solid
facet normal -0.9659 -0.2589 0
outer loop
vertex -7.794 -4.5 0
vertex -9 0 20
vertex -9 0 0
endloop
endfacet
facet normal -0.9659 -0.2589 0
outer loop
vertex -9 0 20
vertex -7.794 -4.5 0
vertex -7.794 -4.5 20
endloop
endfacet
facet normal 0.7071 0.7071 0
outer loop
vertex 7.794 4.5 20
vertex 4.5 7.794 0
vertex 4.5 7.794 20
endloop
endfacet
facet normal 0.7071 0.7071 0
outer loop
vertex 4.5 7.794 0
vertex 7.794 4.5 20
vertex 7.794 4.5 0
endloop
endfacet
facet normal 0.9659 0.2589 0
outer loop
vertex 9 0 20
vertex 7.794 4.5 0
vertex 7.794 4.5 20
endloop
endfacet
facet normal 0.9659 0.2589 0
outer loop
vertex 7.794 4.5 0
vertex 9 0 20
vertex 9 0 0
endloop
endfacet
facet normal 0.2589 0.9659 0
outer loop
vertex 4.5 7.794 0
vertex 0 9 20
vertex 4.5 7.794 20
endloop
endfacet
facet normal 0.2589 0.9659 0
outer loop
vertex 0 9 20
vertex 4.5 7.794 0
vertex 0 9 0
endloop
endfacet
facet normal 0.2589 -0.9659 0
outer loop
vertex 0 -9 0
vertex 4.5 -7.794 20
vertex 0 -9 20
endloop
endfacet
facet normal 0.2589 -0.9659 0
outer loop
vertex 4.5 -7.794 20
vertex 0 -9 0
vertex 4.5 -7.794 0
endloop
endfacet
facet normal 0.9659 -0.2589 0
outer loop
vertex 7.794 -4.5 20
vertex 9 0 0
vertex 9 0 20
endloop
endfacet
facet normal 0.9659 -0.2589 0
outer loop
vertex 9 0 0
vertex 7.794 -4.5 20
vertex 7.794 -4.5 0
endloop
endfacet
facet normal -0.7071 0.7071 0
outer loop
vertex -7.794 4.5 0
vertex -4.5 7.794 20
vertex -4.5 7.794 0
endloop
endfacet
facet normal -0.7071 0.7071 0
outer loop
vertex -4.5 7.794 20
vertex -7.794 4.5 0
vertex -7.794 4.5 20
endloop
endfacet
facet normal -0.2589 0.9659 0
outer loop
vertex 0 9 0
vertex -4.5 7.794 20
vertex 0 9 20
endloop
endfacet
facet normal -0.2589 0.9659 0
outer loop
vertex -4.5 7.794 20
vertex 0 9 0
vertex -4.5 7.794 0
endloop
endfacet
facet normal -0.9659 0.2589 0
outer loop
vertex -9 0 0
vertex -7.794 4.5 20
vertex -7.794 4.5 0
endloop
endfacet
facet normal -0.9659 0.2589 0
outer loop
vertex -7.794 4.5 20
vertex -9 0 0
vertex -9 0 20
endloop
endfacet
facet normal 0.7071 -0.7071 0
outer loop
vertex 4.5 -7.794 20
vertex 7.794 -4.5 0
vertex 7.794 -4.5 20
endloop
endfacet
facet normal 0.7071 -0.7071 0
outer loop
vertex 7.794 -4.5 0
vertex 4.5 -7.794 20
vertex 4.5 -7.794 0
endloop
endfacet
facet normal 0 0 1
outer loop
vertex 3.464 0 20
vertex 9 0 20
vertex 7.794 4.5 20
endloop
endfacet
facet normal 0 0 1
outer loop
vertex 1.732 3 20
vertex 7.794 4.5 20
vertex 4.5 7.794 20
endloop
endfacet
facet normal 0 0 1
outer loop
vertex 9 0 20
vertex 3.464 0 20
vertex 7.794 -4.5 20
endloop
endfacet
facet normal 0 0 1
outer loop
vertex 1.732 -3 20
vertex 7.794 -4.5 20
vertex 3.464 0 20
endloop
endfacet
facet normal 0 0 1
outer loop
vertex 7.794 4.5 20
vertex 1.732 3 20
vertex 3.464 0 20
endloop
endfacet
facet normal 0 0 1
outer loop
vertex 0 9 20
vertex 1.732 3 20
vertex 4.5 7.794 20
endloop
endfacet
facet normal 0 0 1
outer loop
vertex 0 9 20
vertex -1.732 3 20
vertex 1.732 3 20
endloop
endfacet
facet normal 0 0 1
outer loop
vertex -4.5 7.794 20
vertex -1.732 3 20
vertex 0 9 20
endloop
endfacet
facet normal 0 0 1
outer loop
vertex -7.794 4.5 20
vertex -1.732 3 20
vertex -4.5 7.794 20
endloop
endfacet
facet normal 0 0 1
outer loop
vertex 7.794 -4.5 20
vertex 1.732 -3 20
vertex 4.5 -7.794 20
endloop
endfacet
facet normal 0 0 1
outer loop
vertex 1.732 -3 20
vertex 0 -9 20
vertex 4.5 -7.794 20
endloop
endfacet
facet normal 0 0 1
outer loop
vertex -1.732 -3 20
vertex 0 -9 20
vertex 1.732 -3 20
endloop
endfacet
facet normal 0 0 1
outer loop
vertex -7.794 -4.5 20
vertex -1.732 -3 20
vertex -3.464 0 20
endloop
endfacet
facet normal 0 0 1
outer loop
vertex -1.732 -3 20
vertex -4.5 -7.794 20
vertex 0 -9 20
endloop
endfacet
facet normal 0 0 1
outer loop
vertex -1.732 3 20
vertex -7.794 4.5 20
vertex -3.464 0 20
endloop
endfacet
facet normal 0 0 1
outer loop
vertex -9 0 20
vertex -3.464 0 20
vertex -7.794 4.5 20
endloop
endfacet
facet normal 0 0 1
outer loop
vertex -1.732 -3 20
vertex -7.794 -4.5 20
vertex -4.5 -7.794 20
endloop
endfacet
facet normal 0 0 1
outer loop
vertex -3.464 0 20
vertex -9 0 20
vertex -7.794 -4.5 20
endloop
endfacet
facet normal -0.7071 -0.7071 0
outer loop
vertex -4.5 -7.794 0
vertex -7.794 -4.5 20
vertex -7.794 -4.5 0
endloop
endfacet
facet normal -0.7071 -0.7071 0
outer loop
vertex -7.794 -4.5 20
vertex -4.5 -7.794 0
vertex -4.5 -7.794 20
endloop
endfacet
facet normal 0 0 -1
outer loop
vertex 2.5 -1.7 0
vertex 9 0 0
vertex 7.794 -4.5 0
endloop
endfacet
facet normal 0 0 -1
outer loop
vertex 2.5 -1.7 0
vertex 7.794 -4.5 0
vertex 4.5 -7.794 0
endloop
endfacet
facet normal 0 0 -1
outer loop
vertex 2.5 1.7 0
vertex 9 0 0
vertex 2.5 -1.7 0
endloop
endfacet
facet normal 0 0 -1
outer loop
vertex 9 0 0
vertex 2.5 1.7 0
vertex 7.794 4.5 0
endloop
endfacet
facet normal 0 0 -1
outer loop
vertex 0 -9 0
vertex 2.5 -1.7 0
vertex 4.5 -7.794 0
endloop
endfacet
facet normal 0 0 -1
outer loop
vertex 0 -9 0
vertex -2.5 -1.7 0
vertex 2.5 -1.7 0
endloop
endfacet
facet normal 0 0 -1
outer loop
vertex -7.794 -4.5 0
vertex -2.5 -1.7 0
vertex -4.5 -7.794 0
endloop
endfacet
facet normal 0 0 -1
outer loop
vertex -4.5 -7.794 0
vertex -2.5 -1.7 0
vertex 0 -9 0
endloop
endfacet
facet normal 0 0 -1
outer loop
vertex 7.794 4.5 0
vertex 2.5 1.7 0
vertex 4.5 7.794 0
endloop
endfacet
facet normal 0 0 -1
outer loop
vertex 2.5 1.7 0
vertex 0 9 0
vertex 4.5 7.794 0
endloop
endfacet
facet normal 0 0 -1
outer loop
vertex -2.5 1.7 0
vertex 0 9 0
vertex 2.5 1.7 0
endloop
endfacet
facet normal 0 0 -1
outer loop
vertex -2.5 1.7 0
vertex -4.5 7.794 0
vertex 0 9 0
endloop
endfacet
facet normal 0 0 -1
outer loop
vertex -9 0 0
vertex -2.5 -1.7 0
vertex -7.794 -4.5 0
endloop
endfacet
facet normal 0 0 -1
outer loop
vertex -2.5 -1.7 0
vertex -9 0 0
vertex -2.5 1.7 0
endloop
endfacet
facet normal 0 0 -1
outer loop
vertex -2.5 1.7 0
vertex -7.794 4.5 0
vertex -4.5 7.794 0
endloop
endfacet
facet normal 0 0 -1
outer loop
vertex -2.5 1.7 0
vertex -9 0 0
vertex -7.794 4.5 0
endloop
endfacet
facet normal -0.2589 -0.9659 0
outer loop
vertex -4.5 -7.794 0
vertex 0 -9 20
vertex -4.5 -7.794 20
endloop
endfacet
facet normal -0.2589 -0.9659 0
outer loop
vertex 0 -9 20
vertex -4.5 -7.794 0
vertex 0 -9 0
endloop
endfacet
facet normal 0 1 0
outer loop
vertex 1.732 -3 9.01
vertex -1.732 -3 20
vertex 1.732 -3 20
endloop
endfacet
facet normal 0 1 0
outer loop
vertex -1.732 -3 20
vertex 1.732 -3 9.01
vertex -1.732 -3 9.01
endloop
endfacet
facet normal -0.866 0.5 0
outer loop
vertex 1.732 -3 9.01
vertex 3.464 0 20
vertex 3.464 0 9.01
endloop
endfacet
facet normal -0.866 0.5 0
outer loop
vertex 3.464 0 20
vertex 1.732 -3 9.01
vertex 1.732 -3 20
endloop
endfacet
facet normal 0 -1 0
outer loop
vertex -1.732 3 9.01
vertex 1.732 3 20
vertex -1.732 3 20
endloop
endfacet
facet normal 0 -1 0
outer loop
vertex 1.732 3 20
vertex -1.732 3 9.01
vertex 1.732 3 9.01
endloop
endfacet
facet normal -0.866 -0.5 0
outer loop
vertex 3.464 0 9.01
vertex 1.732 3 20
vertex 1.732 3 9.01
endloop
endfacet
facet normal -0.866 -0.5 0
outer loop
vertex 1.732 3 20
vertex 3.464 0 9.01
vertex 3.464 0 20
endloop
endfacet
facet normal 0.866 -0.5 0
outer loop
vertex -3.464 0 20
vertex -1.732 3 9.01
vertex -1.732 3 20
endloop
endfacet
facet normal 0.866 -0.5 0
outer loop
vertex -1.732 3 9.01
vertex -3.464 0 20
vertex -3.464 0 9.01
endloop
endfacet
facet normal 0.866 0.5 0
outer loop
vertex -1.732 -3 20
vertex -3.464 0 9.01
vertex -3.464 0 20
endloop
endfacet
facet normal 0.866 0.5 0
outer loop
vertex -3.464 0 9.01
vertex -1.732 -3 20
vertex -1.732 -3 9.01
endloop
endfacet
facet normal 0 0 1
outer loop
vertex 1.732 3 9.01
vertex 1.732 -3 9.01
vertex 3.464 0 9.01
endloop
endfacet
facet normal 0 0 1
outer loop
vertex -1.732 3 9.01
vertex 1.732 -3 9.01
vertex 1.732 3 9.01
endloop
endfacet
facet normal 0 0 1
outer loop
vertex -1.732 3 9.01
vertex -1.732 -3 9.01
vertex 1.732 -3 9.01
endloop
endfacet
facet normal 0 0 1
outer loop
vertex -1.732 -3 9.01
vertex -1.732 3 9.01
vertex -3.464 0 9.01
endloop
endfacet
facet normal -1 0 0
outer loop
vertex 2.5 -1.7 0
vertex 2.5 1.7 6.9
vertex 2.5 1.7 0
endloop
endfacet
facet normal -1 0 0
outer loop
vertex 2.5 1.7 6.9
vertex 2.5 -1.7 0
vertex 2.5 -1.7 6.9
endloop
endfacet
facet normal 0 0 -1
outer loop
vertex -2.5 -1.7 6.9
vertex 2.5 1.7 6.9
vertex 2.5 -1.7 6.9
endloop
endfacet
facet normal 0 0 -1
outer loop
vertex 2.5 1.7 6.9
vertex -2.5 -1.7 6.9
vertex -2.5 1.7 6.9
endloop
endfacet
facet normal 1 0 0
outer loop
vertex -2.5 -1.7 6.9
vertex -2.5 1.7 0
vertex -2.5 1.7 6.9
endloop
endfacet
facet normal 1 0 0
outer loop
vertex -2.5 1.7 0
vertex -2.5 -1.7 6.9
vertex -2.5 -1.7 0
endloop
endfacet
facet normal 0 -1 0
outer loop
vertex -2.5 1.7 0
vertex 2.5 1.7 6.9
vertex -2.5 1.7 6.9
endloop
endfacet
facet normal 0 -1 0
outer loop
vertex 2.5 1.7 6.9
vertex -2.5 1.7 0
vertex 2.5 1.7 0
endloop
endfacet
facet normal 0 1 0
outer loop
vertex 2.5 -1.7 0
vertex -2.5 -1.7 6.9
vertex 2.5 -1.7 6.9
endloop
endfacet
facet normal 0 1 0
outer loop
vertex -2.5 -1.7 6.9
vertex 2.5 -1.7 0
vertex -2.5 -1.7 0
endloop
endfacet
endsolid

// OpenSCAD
$fn=144;

module cylinder_outer(height,radius,fn){
    fudge = 1/cos(180/fn);
    echo("Fudge = ", fudge);
    echo("New Radius = ", radius*fudge);
    cylinder(h=height,r=radius*fudge,$fn=fn);
}
   
   
module Connector(rod_shaft_diameter) {
    difference() {
    cylinder(20, 9, 9, $fn = 12);
    
    // Rod shaft
    translate([0, 0, 9.01])
        cylinder_outer(11, rod_shaft_diameter / 2, 6);
        
    // Motor shaft
    translate([-5/2, -3.4/2, -0.1])
        cube([5, 3.4, 7]);
    };
    
}


Connector(6.0);
